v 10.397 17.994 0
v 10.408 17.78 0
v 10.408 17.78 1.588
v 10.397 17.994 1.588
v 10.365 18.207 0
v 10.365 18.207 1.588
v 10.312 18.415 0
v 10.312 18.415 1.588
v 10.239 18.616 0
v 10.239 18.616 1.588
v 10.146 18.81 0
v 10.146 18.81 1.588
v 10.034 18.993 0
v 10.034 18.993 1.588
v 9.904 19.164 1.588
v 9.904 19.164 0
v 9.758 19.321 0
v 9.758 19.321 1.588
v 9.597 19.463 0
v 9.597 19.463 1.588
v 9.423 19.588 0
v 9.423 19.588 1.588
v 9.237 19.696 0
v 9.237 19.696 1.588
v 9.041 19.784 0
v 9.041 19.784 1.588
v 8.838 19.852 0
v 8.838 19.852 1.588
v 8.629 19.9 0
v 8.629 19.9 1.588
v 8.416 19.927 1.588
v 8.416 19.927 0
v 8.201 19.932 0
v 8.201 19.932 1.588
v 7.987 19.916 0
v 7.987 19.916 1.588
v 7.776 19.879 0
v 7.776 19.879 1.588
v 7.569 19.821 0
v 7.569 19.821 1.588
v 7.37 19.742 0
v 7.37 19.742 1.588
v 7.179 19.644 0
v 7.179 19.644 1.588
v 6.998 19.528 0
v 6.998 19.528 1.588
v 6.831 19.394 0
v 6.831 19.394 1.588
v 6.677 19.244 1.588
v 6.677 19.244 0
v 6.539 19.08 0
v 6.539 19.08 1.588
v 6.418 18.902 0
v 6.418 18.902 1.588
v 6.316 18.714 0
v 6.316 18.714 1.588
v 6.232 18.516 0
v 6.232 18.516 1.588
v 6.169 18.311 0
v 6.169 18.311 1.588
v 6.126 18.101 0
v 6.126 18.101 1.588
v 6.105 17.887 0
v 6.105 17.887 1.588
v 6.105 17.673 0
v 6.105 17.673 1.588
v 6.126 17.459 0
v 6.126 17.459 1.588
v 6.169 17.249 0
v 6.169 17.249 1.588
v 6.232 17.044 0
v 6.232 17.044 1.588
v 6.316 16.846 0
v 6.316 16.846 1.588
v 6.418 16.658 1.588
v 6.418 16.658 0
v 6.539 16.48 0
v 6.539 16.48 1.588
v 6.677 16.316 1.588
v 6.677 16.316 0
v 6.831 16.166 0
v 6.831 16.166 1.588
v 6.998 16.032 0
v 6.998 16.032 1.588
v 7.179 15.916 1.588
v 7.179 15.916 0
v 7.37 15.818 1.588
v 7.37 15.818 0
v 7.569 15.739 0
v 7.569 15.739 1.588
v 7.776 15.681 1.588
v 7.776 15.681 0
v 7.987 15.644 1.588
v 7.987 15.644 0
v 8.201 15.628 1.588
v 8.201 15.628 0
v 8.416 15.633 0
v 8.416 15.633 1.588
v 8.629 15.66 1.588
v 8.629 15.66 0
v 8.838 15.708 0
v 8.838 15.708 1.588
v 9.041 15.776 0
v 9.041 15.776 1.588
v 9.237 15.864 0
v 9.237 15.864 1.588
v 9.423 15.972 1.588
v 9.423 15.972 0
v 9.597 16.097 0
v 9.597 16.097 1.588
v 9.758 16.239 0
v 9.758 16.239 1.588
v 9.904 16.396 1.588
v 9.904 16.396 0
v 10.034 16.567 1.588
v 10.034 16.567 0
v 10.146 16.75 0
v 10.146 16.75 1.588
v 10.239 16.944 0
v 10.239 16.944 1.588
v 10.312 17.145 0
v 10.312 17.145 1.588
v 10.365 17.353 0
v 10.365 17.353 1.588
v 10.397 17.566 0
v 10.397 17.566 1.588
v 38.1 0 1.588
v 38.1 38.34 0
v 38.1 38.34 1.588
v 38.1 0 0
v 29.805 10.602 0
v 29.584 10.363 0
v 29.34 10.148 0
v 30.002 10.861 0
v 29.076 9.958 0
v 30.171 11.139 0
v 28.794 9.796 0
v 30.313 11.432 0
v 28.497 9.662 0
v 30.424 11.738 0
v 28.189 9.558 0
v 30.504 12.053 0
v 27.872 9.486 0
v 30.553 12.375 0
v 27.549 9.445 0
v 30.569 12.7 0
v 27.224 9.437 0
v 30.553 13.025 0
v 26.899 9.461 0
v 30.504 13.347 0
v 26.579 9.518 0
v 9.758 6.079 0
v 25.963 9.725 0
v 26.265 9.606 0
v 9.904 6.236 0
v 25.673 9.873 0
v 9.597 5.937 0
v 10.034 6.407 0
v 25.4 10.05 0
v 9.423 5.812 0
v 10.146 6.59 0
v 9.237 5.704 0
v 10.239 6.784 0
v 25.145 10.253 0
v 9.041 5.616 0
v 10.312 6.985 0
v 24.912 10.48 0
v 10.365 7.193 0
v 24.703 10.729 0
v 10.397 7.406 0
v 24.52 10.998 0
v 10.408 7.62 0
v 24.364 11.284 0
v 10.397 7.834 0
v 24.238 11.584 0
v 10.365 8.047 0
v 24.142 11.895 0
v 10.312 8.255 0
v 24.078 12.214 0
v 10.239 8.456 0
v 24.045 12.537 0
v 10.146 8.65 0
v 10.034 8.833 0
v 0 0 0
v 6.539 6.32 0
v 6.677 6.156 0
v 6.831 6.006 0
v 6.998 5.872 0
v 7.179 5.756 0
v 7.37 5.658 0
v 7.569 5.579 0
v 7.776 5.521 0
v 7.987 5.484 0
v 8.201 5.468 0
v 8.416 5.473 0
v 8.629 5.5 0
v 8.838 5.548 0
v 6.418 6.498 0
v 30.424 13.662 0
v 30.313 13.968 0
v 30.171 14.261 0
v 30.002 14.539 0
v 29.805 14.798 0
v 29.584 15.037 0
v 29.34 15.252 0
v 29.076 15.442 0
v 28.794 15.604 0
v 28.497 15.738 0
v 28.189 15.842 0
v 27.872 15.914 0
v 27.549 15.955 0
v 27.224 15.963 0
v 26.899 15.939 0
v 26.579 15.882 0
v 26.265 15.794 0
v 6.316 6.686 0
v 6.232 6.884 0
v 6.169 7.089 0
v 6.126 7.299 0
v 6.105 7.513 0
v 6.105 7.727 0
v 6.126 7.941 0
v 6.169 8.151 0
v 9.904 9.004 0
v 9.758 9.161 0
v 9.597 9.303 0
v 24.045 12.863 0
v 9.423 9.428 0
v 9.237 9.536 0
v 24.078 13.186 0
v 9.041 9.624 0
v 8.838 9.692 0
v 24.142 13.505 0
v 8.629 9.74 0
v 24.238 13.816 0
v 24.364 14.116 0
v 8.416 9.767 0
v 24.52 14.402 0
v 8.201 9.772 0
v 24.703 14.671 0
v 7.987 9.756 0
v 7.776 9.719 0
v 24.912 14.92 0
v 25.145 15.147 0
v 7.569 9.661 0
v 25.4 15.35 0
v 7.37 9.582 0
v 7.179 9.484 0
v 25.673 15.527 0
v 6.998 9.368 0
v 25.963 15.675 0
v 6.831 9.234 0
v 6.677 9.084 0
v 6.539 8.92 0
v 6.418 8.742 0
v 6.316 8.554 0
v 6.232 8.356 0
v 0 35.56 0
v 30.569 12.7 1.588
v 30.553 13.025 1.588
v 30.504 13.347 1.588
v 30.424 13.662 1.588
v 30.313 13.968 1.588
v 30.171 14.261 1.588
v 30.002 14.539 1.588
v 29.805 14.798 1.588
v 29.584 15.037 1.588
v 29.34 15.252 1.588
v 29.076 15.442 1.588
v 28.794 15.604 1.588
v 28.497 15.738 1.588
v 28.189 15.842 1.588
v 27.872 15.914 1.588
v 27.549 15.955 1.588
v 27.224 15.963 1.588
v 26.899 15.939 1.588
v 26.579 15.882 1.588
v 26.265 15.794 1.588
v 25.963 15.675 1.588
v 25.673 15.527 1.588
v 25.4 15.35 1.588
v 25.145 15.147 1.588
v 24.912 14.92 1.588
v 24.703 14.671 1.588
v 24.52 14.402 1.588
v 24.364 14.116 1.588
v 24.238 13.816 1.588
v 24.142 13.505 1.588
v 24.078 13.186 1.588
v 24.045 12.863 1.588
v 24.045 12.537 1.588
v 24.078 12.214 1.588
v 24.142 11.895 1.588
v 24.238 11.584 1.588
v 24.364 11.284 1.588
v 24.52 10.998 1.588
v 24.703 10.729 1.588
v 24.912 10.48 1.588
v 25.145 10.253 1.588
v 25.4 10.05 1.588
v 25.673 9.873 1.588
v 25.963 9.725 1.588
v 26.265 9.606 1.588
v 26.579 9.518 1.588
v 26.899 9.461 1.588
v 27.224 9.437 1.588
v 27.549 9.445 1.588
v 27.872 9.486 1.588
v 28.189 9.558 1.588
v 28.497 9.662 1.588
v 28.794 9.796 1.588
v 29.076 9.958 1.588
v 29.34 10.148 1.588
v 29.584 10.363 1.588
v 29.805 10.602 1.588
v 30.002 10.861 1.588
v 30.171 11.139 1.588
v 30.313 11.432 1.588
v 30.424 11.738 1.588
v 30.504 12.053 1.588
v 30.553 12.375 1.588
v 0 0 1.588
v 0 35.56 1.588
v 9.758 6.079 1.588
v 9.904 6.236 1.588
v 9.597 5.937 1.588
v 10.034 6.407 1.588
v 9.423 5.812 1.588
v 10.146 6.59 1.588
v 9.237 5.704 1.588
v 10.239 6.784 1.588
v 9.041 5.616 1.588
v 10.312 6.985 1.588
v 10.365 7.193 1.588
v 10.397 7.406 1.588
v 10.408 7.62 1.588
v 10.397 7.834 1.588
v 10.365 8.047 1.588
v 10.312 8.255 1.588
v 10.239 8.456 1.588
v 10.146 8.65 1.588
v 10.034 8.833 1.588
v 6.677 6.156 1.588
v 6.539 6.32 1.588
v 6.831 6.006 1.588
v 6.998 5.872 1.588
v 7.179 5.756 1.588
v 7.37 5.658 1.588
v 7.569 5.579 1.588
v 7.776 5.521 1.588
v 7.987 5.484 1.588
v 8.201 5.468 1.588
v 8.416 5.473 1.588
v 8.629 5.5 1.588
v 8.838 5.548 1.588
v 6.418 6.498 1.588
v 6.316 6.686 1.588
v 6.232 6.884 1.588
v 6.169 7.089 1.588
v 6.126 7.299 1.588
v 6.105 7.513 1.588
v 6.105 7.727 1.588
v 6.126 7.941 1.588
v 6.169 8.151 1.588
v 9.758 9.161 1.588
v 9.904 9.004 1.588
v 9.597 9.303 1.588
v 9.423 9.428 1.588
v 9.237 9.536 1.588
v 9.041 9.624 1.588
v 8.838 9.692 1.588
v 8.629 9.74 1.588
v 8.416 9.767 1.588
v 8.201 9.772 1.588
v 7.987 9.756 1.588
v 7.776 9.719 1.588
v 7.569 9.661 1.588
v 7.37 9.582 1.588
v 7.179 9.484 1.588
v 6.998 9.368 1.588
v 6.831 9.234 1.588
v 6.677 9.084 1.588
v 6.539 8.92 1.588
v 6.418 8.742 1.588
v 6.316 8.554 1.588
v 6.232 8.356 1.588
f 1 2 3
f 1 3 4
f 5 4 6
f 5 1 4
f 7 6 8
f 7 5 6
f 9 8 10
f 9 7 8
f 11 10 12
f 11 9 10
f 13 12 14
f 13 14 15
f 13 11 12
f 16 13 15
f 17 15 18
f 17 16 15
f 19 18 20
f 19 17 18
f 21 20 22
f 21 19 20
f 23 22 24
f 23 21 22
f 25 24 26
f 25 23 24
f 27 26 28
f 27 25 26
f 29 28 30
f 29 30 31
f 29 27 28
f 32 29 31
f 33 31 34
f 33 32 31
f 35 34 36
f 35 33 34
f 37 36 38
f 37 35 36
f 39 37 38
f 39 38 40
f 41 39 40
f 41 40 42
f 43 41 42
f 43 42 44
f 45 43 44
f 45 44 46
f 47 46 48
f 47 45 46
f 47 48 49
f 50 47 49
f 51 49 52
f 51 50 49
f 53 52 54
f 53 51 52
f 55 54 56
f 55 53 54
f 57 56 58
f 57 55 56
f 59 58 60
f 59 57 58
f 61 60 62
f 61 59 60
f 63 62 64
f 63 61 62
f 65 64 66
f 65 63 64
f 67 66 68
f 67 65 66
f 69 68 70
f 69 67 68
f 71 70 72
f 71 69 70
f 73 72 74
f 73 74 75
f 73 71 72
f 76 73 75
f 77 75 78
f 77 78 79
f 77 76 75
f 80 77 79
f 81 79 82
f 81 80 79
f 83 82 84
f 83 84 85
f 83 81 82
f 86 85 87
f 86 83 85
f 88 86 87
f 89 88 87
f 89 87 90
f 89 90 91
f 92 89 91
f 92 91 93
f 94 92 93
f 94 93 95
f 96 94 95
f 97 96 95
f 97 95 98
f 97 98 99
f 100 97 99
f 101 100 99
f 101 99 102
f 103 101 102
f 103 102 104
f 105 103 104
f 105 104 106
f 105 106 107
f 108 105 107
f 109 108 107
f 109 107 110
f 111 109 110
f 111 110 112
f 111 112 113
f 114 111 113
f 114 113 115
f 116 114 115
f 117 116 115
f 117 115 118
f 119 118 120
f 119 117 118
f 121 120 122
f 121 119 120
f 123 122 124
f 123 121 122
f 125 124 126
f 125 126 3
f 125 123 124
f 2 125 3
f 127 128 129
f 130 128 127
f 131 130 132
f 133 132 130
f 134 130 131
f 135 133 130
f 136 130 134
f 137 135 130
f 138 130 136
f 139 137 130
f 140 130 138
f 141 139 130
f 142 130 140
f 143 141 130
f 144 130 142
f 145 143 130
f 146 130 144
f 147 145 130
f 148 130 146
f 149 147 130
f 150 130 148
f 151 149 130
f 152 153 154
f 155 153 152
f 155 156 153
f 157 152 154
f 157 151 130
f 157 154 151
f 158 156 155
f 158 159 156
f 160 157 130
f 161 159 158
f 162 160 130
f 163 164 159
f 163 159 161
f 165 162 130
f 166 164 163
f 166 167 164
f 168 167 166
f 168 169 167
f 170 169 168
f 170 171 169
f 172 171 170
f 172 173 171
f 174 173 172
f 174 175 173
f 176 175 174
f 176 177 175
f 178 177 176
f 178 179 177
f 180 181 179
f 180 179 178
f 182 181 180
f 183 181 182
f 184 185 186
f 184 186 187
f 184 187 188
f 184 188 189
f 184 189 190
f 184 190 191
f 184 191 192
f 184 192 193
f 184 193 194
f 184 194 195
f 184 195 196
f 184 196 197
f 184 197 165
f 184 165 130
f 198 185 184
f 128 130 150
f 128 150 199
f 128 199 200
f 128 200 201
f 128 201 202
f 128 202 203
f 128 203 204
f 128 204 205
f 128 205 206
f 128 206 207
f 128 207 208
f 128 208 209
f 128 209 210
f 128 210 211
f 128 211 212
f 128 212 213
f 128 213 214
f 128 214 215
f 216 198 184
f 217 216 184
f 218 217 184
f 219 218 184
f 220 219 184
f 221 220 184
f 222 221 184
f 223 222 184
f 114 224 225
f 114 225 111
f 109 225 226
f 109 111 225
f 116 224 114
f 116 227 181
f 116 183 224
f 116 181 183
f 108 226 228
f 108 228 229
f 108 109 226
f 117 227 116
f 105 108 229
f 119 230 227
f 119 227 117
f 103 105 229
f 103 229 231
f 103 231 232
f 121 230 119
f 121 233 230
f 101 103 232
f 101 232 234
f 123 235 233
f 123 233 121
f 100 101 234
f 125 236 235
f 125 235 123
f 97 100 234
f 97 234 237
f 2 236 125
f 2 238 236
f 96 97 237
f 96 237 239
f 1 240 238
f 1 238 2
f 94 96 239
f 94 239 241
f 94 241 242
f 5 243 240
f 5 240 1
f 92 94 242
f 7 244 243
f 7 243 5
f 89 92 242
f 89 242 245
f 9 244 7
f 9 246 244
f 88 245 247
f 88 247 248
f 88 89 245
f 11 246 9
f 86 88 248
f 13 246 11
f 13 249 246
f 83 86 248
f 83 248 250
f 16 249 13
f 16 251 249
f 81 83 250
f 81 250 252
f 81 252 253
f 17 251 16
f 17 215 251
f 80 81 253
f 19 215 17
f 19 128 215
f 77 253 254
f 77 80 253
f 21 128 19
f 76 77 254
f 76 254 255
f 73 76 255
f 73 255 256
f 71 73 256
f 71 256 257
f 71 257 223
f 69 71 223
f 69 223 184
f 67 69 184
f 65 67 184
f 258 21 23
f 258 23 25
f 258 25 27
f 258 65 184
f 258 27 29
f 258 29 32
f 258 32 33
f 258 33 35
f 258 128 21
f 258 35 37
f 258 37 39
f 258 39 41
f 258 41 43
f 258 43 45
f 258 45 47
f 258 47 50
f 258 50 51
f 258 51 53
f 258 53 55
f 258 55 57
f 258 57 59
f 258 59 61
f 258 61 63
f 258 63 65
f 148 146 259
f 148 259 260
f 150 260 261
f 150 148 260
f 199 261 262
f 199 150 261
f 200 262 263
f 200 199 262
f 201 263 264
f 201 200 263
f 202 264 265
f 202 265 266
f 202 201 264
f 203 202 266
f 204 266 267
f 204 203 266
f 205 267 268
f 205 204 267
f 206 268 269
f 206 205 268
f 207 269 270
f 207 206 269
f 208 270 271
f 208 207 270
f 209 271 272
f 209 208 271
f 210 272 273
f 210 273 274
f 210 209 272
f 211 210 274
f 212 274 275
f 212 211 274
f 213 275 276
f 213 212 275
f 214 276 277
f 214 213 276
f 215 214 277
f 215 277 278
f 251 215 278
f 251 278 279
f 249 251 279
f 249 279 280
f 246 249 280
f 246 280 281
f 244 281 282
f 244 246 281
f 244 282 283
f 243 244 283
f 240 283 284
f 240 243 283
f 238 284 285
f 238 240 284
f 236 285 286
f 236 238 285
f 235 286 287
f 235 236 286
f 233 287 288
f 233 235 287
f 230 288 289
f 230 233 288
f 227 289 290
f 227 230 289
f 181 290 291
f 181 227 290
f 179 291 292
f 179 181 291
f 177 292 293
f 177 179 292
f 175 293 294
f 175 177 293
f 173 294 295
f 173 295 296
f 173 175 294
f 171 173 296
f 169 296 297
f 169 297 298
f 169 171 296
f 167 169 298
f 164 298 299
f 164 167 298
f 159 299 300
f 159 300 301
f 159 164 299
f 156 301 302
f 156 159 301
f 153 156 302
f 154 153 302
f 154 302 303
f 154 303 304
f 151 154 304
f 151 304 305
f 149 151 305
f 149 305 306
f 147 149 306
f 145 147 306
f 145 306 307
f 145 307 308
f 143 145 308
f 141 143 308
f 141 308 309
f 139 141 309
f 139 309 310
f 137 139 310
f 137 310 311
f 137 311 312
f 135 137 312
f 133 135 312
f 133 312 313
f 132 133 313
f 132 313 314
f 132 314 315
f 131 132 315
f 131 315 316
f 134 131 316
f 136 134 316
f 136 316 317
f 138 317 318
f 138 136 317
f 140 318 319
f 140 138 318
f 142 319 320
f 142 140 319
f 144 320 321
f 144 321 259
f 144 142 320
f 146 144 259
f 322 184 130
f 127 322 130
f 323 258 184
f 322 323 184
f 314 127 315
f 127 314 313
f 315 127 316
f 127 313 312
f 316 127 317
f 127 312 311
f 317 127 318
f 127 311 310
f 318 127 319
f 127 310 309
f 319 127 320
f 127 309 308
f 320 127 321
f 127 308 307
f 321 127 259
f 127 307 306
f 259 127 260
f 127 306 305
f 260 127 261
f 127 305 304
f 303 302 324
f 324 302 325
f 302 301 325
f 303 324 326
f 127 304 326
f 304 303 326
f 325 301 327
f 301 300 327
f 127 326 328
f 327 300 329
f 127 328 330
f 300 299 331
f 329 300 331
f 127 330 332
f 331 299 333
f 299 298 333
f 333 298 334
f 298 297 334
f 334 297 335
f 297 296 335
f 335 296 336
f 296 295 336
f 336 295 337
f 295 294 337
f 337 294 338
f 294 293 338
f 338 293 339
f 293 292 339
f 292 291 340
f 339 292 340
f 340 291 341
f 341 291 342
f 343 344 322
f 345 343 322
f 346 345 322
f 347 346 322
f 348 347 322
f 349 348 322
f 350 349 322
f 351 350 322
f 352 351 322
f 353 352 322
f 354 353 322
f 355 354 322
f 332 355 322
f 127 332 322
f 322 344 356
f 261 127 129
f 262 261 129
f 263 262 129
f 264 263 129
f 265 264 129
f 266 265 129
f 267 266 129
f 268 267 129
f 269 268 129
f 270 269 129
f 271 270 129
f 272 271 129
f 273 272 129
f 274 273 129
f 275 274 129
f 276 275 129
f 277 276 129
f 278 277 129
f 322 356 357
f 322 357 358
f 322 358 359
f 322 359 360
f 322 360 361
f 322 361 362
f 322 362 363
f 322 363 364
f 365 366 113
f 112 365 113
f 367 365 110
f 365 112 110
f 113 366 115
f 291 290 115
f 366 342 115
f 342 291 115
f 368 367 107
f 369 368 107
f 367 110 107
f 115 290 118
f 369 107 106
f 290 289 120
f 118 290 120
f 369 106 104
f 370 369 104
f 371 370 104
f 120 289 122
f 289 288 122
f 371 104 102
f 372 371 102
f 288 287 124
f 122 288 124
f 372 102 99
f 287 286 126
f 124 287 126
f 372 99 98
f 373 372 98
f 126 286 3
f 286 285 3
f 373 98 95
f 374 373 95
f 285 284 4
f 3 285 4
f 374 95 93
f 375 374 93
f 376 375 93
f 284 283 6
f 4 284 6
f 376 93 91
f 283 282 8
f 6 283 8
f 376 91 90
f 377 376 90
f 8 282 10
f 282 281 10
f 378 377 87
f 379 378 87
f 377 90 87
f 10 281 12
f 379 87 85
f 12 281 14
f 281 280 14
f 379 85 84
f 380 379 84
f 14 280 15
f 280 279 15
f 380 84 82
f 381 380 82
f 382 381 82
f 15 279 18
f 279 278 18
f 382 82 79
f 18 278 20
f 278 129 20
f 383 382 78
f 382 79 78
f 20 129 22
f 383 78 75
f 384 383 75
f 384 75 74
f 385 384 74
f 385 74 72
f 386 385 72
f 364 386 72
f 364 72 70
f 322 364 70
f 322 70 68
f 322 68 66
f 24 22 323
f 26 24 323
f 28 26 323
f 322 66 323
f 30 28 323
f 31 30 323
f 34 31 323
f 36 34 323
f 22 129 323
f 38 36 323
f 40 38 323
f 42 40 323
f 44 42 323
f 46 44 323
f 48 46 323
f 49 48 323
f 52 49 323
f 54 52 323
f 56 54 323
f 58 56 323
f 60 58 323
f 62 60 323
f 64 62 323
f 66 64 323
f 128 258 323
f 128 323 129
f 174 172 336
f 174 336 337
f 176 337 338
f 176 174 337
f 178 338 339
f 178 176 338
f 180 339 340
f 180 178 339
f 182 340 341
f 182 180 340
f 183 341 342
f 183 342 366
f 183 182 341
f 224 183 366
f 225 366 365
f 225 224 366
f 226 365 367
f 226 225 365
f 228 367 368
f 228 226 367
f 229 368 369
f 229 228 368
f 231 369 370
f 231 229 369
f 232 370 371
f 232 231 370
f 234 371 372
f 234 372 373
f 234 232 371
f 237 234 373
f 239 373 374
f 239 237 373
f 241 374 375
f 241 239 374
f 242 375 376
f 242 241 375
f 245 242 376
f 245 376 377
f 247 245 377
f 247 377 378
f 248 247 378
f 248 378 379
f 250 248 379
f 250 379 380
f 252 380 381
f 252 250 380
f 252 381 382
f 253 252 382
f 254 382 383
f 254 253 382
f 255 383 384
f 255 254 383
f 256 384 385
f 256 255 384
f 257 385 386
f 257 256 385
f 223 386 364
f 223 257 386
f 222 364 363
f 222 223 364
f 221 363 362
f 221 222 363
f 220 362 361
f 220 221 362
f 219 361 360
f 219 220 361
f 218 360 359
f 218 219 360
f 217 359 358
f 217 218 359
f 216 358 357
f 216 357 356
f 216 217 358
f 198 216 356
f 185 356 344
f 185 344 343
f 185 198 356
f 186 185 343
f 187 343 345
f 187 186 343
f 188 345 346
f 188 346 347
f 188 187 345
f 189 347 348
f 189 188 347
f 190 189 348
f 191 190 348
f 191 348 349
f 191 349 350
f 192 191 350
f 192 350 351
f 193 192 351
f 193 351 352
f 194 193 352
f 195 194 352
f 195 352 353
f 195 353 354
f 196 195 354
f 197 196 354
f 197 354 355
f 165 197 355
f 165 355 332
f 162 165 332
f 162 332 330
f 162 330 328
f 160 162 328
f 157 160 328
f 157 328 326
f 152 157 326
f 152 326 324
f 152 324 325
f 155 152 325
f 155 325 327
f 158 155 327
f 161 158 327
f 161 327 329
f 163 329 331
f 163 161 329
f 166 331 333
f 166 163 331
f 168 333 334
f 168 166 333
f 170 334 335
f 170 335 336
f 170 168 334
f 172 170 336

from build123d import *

# Parameters (mm, degrees)
SKETCH1_W           = 16.51
SKETCH1_H           = 25.4
SKETCH1_R           = 2.15265
SKETCH1_W_2         = 21.59
SKETCH1_R_2         = 3.2639
BOSS_EXTRUDE1_DEPTH = 1.5875


with BuildPart() as part:
    # Sketch1 → Boss-Extrude1 (new body)
    # profile 1 of 4: a face of its own
    with BuildSketch(Plane.XY):
        Polygon((0, 35.56), (0, 25.4), (16.51, 25.4), (38.1, 25.4), (38.1, 35.56), align=None)
    # profile 2 of 4: a face of its own
    with BuildSketch(Plane.XY):
        with Locations((8.255, 12.7)):
            Rectangle(SKETCH1_W, SKETCH1_H)
        with Locations((8.255, 7.62)):
            Circle(SKETCH1_R, mode=Mode.SUBTRACT)
        with Locations((8.255, 17.78)):
            Circle(SKETCH1_R, mode=Mode.SUBTRACT)
    # profile 3 of 4: a face of its own
    with BuildSketch(Plane.XY):
        with Locations((27.305, 12.7)):
            Rectangle(SKETCH1_W_2, SKETCH1_H)
        with Locations((27.305, 12.7)):
            Circle(SKETCH1_R_2, mode=Mode.SUBTRACT)
    # profile 4 of 4: a face of its own
    with BuildSketch(Plane.XY):
        Polygon((38.1, 38.34043763), (38.1, 35.56), (0, 35.56), align=None)
    extrude(amount=BOSS_EXTRUDE1_DEPTH)


solid = part.part
